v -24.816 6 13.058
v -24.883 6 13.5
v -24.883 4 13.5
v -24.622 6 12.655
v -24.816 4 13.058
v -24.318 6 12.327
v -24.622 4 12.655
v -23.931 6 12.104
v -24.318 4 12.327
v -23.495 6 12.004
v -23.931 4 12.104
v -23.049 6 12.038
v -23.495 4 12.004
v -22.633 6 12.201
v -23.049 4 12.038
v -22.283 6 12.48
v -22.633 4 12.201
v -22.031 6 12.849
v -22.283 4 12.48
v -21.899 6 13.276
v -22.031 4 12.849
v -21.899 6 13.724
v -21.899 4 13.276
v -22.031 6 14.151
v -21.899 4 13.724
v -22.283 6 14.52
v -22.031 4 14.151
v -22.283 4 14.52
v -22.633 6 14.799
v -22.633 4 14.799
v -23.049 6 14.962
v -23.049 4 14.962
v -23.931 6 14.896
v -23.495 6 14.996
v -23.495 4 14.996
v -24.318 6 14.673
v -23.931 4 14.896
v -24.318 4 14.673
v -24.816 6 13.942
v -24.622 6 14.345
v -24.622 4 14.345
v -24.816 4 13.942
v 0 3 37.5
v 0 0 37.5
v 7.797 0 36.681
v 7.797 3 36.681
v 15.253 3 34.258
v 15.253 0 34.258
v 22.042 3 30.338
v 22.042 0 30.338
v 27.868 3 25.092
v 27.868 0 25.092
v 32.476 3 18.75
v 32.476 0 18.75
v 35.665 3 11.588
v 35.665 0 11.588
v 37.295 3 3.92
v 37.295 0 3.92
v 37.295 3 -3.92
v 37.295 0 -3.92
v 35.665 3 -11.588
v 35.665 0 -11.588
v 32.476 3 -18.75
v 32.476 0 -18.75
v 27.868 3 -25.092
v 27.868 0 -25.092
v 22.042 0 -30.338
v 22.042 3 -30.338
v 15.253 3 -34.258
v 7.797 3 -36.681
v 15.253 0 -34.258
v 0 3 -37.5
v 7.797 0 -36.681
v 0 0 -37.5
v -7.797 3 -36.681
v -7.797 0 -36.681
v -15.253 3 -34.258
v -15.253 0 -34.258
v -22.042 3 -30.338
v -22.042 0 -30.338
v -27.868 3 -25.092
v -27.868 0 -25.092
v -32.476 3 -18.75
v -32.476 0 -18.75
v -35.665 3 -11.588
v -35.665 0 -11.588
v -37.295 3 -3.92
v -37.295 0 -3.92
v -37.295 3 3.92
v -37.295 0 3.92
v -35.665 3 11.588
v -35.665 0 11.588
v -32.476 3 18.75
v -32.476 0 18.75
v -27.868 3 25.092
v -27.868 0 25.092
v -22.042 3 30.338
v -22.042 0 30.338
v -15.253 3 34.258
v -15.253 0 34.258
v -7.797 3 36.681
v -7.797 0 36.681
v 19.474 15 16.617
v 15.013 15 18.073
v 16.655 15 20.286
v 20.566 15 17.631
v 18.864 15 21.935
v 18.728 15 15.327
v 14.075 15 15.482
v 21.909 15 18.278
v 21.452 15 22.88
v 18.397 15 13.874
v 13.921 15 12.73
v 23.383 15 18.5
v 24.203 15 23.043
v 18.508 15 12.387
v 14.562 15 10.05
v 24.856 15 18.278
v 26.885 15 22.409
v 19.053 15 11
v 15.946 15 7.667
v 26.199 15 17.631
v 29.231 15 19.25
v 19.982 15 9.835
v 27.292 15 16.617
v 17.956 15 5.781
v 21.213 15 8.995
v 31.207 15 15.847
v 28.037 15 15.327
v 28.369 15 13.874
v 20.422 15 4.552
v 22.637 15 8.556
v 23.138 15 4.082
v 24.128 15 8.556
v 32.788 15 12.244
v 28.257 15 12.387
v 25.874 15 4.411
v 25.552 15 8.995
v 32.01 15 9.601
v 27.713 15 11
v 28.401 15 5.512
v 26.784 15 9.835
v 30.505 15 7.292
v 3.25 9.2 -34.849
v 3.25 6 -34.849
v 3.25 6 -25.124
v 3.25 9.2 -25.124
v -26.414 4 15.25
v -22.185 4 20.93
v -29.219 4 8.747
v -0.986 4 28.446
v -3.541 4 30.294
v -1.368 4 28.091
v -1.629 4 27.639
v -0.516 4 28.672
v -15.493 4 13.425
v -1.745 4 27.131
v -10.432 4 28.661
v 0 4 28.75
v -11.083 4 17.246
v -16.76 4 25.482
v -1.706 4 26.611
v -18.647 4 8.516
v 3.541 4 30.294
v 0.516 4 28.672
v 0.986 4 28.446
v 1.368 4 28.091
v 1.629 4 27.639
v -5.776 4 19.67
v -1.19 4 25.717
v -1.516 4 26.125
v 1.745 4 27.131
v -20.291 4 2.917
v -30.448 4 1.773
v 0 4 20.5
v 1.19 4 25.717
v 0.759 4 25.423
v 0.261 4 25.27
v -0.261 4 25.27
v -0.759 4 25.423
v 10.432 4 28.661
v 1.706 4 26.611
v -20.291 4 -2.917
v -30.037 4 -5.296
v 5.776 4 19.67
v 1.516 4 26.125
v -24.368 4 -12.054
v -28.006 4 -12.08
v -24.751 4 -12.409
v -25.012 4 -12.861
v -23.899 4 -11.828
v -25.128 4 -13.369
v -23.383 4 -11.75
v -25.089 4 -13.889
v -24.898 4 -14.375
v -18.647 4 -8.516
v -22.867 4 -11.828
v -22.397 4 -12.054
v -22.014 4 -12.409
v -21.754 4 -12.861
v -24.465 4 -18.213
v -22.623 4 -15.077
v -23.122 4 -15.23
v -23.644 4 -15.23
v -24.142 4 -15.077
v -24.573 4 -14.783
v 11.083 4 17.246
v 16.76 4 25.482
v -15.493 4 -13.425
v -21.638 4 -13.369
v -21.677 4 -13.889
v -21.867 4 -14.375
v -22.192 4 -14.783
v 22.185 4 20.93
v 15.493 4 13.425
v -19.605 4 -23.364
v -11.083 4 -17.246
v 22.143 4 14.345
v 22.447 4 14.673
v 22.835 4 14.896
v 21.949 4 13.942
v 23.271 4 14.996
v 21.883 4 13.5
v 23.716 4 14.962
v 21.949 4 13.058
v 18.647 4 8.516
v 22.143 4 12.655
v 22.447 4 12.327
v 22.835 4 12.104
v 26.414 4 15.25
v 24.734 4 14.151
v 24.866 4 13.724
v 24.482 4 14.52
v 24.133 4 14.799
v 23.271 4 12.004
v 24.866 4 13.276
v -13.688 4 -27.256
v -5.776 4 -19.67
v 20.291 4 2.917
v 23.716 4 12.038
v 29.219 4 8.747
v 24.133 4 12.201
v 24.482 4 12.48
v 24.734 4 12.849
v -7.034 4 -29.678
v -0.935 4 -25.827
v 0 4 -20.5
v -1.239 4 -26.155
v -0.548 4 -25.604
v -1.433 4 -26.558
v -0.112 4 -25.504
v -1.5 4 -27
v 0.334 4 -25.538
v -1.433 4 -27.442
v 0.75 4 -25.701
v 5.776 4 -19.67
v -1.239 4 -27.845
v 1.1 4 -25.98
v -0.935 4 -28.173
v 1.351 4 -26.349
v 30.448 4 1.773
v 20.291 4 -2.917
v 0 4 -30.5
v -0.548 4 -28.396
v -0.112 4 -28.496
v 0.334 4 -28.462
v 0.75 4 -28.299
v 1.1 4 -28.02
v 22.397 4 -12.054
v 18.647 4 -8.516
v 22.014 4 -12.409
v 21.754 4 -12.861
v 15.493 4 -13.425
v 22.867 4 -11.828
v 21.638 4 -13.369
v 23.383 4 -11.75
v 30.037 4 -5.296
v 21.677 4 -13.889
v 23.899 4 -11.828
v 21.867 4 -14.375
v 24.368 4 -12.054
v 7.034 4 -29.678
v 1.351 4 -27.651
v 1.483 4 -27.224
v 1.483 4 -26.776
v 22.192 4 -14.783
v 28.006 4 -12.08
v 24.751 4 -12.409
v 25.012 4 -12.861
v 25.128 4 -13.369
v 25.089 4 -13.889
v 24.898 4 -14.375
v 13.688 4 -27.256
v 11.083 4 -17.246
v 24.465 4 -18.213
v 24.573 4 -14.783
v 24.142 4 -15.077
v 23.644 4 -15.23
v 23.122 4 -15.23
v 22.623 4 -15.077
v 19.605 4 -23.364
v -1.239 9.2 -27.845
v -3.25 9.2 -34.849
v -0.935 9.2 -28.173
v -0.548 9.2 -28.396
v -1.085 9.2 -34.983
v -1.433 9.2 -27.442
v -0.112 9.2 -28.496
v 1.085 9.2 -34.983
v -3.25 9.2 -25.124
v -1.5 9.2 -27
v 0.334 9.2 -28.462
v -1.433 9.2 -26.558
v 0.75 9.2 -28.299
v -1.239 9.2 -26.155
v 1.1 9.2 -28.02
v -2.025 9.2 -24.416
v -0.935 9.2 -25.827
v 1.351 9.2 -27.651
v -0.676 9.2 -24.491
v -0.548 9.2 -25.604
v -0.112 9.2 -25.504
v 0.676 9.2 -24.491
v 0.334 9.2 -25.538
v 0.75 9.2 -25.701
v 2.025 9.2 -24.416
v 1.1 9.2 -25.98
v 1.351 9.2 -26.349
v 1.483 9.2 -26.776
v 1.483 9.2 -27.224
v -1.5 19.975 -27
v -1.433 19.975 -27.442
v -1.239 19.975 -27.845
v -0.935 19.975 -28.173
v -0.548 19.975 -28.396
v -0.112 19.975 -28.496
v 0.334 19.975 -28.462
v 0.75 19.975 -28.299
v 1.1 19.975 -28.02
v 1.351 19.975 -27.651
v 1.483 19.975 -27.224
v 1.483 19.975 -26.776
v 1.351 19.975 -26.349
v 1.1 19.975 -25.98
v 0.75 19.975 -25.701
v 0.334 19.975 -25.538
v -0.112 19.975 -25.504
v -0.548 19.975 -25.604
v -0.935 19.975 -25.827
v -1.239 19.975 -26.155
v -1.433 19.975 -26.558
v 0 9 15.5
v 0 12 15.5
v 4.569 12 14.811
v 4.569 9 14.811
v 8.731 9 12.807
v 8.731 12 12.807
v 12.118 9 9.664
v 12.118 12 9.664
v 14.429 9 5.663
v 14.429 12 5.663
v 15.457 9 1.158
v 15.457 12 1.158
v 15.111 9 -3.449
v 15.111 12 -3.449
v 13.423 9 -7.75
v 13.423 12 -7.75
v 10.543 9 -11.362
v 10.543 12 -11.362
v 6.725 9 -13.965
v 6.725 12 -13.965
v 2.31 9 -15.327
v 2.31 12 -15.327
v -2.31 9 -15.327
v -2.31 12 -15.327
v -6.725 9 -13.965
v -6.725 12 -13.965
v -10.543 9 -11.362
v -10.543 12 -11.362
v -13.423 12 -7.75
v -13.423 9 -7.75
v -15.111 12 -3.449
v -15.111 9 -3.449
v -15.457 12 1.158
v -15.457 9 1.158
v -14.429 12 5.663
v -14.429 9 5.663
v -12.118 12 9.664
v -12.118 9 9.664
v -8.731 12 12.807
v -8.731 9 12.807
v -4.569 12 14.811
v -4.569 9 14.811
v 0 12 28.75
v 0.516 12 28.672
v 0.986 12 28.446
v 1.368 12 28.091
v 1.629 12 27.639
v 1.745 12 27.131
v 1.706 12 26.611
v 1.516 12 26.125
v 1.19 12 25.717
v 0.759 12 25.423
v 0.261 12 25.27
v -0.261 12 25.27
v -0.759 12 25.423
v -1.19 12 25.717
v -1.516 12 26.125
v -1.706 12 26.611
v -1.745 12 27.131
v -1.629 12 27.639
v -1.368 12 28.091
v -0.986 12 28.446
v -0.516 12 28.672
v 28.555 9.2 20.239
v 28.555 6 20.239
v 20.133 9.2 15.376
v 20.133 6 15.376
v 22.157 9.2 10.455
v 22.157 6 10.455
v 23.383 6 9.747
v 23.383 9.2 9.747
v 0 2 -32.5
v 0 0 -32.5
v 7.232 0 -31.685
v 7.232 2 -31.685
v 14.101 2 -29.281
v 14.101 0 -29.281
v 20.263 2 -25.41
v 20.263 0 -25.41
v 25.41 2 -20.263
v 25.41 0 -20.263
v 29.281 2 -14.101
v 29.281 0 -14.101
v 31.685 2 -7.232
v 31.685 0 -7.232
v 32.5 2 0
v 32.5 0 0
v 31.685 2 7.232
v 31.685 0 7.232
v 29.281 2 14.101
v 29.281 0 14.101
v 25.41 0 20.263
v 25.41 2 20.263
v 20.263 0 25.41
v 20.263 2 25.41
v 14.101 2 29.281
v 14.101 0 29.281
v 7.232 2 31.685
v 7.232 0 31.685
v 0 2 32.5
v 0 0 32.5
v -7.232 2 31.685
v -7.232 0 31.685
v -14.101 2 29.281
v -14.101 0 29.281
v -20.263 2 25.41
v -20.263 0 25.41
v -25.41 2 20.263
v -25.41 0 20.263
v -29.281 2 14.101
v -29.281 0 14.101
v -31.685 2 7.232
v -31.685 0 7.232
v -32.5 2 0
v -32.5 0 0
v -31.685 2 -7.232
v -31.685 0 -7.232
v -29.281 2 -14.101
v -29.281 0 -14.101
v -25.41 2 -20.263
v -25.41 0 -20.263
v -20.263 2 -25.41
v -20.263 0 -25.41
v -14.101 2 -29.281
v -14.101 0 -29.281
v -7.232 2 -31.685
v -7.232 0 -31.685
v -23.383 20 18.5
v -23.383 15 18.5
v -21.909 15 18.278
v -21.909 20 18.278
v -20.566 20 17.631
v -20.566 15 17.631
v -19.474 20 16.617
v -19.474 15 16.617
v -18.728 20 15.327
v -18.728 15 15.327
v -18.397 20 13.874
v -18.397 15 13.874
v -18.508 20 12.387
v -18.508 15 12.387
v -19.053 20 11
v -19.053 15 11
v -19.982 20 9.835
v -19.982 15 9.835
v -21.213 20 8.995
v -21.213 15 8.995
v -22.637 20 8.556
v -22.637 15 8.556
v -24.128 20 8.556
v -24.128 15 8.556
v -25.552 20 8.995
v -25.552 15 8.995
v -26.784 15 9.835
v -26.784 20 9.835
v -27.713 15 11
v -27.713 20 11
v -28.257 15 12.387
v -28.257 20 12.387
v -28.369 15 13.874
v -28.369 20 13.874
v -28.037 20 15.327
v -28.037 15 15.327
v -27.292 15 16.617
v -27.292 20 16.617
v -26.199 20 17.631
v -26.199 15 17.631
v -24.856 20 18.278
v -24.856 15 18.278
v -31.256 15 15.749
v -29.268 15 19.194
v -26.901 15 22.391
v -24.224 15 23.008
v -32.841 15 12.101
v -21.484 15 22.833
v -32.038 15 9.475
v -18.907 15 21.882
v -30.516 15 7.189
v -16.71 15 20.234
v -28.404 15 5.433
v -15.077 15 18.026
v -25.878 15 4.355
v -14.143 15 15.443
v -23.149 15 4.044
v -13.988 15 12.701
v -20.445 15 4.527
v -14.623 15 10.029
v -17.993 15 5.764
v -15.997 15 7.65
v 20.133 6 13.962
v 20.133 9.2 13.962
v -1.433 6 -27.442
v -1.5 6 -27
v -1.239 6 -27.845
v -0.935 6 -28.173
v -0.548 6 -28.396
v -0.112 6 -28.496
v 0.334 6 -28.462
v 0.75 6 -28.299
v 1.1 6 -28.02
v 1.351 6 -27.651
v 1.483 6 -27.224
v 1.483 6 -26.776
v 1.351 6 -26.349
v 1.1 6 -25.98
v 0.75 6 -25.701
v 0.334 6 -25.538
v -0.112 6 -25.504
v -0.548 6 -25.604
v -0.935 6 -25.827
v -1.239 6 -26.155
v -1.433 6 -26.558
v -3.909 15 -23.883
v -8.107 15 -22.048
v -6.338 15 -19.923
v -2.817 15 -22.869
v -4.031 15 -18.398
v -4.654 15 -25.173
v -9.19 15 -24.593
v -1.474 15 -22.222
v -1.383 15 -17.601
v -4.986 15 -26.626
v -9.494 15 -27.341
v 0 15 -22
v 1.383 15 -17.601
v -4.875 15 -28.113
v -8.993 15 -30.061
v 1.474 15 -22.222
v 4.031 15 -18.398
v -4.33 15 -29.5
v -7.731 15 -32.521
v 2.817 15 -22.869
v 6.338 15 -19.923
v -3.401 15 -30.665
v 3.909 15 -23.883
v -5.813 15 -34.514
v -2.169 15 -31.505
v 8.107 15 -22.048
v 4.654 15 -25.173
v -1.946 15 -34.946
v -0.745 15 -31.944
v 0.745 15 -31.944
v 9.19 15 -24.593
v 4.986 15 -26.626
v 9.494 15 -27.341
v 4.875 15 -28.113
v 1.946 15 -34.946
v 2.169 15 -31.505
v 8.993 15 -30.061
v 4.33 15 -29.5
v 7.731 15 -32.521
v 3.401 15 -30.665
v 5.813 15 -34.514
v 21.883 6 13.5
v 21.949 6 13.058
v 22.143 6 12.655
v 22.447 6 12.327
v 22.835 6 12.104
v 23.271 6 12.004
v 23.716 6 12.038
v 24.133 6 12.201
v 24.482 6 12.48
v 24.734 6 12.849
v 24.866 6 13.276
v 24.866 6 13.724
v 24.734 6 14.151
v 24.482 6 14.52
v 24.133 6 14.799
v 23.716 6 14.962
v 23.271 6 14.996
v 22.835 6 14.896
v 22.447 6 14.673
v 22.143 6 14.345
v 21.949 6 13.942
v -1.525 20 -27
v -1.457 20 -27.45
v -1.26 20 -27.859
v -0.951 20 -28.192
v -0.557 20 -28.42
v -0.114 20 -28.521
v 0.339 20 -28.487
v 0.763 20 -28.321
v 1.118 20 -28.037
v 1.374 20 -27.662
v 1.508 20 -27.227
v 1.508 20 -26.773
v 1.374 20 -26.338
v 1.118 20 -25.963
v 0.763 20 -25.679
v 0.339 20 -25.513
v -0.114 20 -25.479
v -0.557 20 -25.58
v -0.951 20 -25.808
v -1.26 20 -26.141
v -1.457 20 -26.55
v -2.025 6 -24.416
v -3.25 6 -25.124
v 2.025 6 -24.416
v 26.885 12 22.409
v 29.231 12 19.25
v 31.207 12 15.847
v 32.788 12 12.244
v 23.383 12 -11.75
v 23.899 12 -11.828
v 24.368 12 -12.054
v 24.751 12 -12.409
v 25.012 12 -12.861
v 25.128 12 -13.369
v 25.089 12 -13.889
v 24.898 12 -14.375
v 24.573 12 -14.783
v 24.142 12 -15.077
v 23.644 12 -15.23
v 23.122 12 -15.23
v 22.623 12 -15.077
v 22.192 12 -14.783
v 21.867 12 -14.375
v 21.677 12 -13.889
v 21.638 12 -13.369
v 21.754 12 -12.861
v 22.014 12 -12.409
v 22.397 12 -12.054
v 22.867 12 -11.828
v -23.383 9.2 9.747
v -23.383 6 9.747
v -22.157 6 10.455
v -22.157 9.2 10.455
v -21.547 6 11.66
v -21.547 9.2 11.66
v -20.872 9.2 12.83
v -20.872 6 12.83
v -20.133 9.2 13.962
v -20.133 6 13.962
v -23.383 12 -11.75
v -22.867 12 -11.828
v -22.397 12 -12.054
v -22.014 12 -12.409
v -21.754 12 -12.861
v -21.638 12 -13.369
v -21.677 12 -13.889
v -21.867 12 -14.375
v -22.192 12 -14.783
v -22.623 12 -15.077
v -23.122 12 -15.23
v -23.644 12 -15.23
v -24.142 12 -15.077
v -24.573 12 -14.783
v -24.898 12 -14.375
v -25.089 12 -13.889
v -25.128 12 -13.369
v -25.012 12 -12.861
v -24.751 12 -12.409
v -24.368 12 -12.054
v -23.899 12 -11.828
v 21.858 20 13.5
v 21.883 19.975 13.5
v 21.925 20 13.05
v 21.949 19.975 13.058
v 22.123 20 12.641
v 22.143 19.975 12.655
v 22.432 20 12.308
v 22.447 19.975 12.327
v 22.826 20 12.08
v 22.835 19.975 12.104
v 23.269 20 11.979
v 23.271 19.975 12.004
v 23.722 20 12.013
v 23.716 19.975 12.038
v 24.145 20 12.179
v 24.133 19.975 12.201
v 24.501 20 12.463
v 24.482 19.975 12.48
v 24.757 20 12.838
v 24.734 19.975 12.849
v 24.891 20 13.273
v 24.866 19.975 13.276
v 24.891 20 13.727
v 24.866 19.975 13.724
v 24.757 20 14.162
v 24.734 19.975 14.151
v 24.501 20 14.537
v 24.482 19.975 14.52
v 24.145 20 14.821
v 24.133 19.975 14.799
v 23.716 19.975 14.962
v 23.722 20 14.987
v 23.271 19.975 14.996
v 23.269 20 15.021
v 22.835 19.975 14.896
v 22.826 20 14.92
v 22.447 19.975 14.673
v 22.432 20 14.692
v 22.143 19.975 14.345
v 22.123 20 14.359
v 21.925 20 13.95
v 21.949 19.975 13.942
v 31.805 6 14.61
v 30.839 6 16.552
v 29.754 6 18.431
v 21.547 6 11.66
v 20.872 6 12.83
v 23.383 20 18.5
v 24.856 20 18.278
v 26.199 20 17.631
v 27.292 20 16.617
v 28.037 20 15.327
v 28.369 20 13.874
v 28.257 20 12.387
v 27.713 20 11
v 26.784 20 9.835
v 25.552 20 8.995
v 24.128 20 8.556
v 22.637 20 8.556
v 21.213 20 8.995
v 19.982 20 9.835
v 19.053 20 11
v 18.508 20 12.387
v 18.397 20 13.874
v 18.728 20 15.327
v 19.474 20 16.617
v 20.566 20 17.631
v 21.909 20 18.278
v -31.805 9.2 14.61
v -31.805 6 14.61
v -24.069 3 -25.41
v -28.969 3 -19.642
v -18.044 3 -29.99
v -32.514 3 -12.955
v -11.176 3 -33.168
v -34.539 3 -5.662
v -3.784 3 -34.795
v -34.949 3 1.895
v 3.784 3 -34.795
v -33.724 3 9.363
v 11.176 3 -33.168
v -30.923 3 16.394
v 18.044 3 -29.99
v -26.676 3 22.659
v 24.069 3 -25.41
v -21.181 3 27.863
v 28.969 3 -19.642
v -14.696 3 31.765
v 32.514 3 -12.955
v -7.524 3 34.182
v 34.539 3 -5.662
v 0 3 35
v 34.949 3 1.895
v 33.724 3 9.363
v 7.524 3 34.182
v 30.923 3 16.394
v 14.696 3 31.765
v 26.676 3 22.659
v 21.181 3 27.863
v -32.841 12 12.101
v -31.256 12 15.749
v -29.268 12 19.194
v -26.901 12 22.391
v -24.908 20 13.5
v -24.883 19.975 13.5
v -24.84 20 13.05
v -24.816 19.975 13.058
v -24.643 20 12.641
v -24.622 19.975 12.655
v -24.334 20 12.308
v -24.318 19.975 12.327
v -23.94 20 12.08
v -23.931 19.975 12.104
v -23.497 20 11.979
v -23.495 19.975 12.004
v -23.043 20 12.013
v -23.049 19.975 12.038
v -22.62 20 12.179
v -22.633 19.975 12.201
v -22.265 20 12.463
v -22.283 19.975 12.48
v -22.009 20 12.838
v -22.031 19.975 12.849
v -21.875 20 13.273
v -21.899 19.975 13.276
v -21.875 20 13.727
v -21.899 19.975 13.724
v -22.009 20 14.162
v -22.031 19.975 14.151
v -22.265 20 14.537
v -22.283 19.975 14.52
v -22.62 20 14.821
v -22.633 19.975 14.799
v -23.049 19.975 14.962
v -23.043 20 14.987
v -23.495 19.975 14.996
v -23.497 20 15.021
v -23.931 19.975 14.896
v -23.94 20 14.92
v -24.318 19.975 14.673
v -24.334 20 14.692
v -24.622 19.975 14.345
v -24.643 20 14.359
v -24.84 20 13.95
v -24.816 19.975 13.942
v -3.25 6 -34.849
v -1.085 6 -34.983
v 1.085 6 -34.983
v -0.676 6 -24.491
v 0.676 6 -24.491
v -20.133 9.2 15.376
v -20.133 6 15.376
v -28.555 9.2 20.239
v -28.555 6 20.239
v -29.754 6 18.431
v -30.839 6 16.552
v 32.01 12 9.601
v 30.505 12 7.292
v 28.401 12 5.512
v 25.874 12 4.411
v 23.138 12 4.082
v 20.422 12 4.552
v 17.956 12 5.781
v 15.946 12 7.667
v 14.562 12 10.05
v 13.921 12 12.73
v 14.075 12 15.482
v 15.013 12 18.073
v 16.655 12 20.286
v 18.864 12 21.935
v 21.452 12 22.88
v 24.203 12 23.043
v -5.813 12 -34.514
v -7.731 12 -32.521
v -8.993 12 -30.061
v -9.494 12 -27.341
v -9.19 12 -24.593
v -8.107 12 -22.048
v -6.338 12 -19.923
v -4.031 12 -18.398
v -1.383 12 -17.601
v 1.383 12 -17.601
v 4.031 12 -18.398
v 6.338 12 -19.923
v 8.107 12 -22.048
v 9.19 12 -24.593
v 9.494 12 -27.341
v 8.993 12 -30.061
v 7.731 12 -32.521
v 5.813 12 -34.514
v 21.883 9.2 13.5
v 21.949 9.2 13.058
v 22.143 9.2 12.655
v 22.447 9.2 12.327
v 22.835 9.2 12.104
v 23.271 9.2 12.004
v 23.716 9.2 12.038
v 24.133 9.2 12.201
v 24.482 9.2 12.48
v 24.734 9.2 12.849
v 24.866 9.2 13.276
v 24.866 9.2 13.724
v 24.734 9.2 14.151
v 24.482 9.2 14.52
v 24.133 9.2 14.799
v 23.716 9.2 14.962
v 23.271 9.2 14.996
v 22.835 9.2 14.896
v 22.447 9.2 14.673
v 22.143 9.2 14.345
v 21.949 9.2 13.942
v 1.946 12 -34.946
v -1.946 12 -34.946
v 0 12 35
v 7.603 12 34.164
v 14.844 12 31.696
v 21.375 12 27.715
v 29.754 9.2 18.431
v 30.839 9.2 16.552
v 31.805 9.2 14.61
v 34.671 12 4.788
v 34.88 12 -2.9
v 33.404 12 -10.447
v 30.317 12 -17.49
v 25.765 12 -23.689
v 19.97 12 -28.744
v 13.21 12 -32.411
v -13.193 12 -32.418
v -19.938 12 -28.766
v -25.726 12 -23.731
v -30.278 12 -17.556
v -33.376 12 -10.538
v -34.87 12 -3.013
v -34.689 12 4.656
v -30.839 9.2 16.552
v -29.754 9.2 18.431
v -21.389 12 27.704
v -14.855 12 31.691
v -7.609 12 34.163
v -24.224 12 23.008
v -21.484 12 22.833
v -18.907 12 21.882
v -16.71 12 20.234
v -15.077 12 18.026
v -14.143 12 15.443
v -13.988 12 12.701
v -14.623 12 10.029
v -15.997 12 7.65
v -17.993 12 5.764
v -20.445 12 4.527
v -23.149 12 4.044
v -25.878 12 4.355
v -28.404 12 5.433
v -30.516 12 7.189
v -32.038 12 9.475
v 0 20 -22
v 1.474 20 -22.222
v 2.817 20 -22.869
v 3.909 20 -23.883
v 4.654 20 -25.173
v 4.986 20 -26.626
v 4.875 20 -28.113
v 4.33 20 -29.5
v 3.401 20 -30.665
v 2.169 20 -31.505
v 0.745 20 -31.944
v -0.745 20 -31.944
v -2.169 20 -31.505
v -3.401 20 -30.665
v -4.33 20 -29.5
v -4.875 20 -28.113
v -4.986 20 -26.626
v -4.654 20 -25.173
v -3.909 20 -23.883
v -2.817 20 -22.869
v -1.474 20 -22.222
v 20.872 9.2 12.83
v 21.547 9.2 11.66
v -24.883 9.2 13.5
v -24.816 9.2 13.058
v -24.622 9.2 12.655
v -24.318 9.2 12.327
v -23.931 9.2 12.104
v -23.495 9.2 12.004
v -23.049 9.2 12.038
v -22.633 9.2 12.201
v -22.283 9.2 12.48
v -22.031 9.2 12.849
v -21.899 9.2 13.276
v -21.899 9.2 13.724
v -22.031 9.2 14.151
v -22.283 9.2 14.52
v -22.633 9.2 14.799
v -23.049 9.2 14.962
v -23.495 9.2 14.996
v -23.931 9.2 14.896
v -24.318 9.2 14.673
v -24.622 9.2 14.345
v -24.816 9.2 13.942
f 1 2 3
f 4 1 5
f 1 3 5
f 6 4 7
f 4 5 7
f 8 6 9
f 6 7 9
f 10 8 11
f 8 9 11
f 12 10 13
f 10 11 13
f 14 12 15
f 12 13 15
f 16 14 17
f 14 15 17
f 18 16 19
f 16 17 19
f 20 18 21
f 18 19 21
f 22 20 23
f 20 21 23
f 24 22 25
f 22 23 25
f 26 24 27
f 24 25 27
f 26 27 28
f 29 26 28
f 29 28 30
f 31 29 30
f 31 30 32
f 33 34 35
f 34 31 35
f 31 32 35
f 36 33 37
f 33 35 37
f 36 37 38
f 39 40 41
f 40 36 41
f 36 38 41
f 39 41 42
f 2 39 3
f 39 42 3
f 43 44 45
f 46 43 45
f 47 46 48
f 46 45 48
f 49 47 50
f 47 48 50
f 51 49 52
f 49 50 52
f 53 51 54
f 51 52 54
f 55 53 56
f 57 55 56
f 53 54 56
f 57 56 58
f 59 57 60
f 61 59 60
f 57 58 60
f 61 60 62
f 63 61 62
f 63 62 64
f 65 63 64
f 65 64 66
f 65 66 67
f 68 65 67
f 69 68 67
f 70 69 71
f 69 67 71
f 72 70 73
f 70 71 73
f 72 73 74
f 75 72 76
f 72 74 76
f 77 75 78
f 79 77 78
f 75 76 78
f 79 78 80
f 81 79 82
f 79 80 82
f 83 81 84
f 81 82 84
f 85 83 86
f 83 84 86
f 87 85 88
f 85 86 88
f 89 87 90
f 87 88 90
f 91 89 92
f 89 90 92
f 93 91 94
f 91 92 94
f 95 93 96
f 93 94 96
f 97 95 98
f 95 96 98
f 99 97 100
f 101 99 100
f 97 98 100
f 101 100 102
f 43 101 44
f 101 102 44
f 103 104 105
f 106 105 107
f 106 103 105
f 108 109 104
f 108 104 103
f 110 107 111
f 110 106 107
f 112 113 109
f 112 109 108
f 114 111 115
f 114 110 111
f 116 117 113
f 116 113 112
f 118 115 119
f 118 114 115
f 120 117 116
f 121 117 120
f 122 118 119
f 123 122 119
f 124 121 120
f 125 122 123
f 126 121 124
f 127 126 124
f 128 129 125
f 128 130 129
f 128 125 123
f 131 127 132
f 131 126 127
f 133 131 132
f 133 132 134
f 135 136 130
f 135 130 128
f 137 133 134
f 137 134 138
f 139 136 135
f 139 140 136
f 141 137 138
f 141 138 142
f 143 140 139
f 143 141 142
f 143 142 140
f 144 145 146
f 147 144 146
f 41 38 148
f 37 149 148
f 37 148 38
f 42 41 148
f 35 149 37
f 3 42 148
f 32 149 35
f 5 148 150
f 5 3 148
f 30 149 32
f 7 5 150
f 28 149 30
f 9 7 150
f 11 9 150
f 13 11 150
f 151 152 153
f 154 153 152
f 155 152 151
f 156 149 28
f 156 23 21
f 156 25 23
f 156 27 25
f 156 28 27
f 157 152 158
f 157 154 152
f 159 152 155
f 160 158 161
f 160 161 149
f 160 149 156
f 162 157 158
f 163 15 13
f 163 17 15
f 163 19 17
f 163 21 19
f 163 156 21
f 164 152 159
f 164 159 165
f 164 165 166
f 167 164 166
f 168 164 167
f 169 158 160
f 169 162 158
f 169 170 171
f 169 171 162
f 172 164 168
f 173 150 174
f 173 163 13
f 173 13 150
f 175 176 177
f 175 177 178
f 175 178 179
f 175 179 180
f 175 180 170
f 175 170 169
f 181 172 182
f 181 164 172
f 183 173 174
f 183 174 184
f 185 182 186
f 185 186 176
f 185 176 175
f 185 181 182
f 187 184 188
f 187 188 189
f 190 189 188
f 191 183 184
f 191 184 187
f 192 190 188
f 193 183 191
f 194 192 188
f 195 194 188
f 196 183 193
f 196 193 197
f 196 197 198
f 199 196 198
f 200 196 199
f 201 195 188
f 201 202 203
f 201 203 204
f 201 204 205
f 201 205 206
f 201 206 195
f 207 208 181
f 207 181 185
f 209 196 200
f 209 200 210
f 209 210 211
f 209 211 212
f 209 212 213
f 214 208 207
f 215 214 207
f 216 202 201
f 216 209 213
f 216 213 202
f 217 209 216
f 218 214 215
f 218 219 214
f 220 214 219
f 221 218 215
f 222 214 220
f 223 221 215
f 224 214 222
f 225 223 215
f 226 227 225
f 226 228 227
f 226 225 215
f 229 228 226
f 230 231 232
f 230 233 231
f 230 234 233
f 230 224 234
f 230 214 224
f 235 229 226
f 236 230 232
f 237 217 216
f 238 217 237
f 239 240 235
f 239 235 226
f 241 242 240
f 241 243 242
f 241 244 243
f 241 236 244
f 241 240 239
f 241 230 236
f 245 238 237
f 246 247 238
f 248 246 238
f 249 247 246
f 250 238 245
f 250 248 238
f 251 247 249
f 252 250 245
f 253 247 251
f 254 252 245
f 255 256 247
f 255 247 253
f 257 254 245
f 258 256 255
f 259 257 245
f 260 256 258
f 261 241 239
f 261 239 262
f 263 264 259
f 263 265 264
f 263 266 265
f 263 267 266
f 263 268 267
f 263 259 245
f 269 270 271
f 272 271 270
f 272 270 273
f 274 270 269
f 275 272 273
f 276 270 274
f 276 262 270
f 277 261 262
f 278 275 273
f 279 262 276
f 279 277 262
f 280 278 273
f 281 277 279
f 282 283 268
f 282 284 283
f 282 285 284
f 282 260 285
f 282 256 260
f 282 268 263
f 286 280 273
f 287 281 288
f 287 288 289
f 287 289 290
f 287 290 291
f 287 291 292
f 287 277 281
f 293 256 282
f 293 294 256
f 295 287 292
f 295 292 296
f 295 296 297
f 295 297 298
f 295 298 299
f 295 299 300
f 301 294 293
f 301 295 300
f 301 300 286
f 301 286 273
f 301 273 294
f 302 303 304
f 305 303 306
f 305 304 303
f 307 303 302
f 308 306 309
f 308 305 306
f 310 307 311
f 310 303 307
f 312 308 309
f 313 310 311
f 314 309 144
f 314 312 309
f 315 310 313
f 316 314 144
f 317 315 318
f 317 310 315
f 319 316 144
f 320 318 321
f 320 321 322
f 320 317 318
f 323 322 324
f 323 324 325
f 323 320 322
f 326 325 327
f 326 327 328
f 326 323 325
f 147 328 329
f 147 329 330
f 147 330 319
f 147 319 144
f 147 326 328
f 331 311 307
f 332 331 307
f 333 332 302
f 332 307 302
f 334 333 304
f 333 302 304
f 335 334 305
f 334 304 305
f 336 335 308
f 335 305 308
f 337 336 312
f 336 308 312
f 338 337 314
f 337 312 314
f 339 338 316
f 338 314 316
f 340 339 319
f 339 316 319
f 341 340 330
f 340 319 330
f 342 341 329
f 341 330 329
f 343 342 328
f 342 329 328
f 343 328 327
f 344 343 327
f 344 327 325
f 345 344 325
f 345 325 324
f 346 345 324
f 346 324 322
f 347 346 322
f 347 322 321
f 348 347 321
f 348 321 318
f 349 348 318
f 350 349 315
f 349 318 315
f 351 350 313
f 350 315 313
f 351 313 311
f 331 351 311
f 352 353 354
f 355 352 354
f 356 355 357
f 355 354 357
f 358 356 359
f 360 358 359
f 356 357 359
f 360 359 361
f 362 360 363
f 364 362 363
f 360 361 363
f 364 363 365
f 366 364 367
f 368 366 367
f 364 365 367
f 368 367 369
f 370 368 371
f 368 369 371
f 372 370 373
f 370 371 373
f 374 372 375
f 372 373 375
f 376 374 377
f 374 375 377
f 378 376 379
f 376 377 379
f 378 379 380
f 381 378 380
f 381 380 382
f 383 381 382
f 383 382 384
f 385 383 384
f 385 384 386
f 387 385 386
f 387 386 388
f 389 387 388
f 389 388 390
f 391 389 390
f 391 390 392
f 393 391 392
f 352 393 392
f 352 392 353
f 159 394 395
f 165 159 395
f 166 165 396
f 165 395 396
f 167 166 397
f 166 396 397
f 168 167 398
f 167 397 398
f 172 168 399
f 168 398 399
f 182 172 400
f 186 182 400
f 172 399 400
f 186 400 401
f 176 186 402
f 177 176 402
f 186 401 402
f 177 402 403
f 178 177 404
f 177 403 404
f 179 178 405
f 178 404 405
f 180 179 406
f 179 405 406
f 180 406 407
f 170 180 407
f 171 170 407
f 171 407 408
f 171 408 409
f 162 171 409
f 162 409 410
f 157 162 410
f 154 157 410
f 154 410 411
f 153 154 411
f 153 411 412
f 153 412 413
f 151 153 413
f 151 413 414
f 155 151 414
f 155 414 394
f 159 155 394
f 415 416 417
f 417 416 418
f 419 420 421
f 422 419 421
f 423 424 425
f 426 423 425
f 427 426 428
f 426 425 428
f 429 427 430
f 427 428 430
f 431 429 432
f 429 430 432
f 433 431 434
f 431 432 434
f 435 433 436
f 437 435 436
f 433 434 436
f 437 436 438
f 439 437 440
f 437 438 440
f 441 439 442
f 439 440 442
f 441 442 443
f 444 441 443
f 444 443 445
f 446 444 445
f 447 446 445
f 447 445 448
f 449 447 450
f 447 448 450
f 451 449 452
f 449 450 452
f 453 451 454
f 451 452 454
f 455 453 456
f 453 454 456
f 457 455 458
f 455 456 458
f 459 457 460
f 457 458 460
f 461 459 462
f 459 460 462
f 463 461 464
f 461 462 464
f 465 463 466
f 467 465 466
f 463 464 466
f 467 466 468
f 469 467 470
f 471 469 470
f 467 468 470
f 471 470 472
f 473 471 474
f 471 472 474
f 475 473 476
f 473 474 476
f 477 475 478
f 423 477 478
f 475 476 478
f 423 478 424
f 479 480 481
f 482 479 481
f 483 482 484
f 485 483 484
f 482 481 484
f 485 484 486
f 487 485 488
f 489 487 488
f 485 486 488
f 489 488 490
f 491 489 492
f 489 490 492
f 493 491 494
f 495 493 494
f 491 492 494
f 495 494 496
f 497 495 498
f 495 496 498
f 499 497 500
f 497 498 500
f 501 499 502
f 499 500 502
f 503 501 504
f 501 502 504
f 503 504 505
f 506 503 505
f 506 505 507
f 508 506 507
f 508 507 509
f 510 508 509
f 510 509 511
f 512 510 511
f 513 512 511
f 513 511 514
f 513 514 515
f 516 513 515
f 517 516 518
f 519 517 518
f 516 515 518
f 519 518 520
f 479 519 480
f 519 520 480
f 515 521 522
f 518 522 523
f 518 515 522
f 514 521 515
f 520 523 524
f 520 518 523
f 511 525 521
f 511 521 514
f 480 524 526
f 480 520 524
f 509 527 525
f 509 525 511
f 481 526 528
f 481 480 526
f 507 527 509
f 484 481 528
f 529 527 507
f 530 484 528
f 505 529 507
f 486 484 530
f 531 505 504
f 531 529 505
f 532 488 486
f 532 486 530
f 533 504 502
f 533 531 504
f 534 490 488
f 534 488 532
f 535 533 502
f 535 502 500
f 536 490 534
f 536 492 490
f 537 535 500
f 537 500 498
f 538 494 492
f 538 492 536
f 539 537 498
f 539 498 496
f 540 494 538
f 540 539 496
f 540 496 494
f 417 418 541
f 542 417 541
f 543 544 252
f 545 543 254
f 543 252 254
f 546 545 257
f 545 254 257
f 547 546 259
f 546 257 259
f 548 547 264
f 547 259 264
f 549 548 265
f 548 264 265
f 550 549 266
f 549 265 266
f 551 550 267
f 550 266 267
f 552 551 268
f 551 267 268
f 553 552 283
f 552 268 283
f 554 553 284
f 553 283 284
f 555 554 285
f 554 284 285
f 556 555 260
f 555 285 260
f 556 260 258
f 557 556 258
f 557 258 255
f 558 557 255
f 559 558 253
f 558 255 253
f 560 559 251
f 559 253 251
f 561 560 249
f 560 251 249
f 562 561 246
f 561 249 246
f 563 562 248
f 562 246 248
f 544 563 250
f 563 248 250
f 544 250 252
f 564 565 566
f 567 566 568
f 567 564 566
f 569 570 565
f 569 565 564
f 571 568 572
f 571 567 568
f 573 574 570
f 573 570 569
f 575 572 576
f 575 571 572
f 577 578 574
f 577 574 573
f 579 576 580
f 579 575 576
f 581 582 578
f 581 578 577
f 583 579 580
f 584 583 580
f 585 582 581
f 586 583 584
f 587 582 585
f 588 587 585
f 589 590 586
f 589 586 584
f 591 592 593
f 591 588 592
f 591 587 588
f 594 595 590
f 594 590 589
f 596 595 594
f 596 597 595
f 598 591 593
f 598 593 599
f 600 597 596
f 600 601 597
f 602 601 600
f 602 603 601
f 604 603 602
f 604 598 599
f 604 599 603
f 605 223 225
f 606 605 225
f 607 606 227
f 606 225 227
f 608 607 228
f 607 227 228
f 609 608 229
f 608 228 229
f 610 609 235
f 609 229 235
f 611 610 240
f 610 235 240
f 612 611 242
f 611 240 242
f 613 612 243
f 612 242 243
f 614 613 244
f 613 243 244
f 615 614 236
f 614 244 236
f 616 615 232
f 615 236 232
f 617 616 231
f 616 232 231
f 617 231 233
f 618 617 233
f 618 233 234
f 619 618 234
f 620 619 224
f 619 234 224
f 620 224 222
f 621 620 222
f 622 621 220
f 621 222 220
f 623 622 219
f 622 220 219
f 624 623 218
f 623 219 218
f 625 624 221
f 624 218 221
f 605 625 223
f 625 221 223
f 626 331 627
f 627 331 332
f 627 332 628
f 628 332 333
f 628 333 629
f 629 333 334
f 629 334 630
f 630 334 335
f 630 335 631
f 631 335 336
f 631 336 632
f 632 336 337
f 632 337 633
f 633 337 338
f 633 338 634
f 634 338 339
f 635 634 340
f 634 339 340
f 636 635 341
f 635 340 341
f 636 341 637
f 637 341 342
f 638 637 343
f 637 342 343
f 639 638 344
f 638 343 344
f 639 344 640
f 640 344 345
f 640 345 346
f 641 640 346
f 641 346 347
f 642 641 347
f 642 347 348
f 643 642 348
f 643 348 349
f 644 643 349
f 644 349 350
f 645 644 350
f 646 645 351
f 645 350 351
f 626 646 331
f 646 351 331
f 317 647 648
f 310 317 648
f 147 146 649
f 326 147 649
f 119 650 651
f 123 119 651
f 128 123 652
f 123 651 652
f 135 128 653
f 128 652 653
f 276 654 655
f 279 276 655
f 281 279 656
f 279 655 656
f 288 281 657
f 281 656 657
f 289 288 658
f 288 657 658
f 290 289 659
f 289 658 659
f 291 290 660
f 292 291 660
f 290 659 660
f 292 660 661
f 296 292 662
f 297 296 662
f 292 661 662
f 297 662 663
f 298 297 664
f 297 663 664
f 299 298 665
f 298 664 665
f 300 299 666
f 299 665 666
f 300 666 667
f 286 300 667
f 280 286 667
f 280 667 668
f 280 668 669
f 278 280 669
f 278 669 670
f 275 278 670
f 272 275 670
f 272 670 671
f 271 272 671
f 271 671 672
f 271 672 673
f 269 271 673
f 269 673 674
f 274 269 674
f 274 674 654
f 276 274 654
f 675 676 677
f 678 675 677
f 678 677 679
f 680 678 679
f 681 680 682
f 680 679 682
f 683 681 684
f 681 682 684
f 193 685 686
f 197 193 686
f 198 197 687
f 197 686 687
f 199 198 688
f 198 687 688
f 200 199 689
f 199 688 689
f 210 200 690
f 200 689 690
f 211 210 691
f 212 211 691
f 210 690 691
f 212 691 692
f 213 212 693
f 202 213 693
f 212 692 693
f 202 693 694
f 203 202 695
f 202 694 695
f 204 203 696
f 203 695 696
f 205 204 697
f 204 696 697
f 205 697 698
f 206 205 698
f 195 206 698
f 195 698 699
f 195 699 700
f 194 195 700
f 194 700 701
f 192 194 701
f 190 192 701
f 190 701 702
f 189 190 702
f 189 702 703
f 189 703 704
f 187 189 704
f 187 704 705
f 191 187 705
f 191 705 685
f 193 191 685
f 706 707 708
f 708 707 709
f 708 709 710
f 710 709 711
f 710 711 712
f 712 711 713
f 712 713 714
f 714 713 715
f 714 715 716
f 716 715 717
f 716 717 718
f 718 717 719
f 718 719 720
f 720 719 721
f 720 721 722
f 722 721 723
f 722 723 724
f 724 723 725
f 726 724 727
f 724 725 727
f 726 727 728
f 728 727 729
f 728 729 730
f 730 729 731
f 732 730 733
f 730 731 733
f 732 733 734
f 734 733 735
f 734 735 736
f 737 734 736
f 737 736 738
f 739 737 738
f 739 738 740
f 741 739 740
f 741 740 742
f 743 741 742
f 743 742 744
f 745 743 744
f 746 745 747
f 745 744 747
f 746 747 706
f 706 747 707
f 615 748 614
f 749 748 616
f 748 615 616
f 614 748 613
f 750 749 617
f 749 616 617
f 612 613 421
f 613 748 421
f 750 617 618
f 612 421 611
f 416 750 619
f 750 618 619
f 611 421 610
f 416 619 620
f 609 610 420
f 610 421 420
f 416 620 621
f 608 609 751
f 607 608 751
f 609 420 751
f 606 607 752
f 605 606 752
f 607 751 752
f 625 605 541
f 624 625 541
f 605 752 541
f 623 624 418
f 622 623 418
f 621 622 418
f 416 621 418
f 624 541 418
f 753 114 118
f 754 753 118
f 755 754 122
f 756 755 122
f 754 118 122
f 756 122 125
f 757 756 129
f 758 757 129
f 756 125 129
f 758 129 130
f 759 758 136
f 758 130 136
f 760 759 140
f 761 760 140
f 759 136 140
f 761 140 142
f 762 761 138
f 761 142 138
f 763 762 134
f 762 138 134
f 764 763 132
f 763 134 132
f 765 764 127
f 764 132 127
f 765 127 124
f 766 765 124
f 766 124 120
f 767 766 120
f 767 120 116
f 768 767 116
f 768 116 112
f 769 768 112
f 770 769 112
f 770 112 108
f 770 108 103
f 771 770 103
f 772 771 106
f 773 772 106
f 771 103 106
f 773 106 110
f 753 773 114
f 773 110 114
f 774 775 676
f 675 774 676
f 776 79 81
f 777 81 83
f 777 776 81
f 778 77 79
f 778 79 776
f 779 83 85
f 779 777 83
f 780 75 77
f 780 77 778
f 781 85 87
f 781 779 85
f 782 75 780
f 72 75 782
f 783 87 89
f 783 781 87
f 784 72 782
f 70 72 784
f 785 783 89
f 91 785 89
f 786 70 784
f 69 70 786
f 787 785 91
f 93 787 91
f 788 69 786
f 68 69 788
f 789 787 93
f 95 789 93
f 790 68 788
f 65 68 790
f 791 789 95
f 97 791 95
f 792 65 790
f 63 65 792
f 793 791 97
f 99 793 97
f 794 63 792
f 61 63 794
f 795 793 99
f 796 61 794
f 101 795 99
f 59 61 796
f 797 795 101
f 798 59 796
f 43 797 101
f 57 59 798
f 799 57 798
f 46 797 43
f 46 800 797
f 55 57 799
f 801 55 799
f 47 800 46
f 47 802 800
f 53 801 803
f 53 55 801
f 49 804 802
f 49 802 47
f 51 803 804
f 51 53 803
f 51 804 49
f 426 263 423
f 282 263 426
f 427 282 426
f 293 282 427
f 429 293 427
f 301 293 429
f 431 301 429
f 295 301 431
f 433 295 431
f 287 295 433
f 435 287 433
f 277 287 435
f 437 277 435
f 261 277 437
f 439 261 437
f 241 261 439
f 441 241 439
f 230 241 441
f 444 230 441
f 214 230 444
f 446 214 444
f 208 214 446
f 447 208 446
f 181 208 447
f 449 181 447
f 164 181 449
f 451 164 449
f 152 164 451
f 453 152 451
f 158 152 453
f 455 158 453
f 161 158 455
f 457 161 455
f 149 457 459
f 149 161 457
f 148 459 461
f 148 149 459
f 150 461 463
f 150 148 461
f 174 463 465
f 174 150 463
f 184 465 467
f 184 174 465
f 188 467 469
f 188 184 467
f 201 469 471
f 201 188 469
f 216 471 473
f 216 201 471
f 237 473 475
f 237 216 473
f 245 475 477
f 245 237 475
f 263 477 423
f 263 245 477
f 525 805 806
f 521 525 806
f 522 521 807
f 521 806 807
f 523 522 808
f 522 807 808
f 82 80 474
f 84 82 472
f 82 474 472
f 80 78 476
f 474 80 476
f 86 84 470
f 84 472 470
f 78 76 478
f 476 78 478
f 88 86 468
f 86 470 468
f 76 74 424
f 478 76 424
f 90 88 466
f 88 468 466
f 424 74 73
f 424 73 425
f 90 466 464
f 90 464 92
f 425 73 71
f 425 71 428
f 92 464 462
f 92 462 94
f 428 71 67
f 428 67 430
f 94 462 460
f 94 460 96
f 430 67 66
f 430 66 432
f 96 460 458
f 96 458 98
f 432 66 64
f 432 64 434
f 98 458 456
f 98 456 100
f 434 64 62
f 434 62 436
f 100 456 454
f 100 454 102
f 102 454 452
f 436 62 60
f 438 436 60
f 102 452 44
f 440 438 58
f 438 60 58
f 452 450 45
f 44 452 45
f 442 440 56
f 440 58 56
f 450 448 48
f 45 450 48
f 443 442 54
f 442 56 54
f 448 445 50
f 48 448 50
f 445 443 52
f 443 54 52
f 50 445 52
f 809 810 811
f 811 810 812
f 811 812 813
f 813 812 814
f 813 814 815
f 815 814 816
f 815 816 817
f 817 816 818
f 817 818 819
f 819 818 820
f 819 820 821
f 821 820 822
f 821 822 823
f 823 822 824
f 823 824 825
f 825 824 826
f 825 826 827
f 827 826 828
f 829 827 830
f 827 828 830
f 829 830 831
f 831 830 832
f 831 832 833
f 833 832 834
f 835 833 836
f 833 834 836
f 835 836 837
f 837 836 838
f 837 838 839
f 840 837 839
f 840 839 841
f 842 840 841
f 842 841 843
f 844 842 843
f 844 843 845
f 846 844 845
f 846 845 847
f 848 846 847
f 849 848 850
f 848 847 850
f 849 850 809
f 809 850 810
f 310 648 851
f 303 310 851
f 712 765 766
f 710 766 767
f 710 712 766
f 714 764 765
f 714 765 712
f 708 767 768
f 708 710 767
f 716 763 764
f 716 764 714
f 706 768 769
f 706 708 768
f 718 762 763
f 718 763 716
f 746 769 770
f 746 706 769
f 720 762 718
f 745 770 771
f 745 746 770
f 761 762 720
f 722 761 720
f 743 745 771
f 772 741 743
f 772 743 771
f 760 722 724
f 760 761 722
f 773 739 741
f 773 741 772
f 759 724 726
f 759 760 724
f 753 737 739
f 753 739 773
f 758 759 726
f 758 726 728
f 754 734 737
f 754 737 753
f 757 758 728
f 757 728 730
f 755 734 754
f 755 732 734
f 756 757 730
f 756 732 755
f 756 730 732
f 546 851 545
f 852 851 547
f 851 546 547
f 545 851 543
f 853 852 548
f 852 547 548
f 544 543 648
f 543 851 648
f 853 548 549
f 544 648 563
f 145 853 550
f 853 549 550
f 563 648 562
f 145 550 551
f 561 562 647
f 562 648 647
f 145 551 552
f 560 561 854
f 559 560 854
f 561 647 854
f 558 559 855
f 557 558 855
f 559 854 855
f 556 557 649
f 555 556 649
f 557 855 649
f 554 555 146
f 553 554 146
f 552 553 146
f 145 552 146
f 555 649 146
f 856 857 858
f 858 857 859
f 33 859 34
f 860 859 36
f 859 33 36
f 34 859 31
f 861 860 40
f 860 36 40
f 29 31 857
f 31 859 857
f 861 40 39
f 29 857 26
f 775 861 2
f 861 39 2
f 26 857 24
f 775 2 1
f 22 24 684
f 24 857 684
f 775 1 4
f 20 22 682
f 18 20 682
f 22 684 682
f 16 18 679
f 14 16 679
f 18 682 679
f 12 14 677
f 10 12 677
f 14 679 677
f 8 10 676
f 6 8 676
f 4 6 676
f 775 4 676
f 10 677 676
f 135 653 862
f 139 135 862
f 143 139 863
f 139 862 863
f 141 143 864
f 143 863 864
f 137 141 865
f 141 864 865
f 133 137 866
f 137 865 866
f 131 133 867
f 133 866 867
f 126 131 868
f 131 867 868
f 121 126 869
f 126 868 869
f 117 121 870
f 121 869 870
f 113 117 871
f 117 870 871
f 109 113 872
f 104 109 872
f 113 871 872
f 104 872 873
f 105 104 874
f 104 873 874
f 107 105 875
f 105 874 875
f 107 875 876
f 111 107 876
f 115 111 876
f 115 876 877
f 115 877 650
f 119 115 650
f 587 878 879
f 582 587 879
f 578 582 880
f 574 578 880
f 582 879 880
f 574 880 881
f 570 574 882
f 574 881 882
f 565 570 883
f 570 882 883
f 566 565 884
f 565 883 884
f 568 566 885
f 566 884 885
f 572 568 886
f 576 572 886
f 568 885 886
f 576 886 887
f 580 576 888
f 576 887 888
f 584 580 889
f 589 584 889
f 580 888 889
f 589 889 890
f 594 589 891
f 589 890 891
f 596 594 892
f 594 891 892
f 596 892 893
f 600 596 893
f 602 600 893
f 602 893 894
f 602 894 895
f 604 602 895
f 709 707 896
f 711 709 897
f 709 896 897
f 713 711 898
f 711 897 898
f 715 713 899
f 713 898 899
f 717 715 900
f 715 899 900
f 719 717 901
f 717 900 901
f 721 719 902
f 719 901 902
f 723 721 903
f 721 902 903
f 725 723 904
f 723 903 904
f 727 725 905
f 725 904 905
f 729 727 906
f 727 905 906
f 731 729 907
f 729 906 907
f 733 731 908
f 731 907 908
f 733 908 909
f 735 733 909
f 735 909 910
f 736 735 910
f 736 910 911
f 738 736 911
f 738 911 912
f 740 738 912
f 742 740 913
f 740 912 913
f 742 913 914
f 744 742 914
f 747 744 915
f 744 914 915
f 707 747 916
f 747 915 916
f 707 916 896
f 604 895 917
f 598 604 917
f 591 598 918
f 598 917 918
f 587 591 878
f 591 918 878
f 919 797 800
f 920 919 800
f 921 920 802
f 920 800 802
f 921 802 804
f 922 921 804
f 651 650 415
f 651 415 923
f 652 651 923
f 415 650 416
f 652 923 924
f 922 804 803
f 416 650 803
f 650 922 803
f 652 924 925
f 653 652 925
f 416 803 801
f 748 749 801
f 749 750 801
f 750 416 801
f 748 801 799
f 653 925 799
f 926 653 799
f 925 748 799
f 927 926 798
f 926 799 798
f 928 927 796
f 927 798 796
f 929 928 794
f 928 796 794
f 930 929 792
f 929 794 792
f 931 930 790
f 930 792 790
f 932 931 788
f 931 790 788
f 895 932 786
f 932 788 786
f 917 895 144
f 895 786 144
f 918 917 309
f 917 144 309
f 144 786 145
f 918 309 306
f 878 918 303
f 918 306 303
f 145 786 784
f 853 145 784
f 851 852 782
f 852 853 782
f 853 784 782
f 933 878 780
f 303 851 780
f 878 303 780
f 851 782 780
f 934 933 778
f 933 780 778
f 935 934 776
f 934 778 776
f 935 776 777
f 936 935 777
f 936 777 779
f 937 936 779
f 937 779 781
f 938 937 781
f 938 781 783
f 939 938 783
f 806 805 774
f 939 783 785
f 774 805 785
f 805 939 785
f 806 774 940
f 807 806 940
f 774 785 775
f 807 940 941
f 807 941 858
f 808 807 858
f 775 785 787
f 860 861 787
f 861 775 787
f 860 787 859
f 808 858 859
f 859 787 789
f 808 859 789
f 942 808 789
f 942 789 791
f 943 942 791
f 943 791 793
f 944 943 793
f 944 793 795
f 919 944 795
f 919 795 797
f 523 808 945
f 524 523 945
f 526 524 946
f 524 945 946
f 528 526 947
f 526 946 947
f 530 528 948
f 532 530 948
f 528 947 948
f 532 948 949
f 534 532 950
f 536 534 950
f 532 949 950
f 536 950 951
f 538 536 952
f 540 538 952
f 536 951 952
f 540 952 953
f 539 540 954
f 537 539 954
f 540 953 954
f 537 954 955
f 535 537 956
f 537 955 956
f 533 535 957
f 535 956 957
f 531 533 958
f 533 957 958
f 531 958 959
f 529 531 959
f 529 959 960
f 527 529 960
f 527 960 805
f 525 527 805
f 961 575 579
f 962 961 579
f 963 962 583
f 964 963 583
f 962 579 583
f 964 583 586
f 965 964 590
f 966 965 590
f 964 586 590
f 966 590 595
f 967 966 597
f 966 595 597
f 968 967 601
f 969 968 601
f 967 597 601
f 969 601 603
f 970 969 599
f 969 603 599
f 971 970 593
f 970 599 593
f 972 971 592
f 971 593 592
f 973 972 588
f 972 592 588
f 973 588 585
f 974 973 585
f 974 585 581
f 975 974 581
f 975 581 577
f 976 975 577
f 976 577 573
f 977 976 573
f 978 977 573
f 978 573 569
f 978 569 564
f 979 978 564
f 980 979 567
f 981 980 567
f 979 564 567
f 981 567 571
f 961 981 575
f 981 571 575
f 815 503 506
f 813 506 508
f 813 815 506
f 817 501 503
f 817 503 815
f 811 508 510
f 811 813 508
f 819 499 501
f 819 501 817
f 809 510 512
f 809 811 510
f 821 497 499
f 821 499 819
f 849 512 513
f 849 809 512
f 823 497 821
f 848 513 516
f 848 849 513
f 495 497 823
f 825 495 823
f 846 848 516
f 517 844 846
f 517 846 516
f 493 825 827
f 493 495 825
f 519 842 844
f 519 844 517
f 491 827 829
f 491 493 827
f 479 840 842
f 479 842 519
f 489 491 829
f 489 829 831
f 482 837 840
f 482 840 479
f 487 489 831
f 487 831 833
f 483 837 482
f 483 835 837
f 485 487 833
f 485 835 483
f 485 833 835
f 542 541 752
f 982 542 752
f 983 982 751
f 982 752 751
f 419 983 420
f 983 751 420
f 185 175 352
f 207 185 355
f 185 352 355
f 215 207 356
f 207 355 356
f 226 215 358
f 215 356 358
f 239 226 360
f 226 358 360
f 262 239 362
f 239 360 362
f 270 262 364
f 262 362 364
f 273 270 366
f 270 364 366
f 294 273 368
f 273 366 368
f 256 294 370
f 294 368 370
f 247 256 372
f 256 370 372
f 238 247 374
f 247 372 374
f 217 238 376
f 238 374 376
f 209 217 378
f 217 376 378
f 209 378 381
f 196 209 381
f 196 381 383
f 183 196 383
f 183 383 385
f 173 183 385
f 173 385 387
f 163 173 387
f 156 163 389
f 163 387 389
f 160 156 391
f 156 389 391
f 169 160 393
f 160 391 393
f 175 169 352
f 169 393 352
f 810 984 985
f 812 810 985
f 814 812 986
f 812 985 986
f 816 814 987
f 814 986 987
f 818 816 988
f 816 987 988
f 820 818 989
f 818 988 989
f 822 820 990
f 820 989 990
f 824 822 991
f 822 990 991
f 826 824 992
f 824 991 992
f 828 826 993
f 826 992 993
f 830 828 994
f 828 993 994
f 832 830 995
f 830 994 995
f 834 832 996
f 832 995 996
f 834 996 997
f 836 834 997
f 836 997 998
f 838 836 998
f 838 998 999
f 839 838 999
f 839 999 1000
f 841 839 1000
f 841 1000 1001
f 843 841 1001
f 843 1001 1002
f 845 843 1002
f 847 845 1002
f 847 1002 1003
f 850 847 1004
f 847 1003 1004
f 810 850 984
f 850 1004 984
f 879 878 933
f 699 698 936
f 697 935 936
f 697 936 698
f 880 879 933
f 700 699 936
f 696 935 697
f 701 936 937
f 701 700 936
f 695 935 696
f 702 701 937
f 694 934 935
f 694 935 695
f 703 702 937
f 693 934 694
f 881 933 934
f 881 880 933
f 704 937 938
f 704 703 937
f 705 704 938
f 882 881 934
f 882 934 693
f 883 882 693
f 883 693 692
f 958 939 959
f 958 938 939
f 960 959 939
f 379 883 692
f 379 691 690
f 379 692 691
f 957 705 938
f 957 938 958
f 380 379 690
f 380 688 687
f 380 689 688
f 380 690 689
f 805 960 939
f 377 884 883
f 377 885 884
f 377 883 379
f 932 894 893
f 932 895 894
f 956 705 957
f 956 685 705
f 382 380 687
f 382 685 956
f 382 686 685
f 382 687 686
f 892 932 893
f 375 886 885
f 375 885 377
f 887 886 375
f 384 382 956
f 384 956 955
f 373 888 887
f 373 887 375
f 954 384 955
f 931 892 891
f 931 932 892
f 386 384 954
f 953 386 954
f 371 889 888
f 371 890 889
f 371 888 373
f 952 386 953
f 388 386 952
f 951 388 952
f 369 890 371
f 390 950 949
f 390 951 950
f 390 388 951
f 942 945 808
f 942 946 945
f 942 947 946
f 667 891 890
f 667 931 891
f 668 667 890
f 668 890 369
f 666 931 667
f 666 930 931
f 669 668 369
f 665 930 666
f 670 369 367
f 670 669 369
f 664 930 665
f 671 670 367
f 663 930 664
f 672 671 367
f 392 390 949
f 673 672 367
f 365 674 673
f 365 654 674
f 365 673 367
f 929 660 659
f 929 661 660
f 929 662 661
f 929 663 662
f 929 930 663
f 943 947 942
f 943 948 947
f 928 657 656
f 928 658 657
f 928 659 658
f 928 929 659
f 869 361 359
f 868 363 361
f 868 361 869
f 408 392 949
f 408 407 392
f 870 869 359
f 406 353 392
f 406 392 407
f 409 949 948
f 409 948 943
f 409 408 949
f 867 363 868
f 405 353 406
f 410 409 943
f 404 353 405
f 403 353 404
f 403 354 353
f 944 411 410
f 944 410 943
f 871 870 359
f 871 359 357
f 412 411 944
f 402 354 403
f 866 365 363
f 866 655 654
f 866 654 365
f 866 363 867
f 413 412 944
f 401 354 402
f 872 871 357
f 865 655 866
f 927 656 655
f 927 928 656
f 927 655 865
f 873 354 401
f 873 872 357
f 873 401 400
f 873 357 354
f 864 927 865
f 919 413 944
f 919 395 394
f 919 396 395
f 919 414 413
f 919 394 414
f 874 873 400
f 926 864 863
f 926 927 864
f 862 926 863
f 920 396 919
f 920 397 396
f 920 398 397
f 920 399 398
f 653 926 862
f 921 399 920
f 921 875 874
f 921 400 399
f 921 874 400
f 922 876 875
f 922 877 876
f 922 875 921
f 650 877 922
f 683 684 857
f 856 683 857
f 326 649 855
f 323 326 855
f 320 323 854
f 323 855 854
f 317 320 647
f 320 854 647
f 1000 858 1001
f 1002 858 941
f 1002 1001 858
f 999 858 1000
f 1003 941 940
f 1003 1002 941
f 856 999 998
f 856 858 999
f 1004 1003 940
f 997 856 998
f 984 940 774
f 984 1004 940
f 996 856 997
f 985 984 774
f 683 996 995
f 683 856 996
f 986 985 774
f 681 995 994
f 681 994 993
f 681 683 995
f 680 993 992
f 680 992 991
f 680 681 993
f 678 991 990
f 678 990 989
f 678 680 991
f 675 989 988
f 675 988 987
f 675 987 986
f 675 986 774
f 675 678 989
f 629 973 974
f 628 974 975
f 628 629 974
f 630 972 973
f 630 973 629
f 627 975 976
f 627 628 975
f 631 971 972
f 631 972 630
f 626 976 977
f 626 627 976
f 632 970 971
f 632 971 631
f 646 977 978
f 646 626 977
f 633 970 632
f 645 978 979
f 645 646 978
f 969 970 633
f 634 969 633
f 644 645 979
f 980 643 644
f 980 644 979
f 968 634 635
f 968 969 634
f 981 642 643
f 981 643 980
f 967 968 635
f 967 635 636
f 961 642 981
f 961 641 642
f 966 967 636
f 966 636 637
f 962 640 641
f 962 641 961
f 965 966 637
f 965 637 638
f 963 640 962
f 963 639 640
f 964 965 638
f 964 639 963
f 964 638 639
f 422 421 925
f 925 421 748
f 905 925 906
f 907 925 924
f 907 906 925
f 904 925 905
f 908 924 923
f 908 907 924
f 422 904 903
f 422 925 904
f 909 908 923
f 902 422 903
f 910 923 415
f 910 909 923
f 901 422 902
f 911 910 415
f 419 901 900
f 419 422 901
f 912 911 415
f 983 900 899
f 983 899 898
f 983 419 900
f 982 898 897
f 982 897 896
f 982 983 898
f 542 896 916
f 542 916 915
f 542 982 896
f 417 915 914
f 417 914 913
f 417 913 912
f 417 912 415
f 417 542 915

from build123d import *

# Parameters (mm, degrees)
SKETCH1_R                       = 37.5
BOSS_EXTRUDE1_DEPTH             = 3
SKETCH1_3_R                     = 35
BOSS_EXTRUDE2_DEPTH             = 12
SKETCH4_R                       = 15.5
CUT_EXTRUDE1_DEPTH              = 15
BOSS_EXTRUDE3_DEPTH             = 3
SKETCH18_R                      = 5
BOSS_EXTRUDE4_DEPTH             = 5
CHAMFER1_SIZE                   = 9
F_3_0MM_DOWEL_HOLE1_D           = 3
F_3_0MM_DOWEL_HOLE1_CSINK_D     = 3.05
F_3_0MM_DOWEL_HOLE1_CSINK_ANGLE = 90
SKETCH27_R                      = 1.75
CUT_EXTRUDE2_DEPTH              = 55.373706881
CUT_EXTRUDE3_START              = -6
SKETCH28_R                      = 1.5
CUT_EXTRUDE3_DEPTH              = 3.2
CIRPATTERN1_COUNT               = 3
SKETCH29_R                      = 32.5
CUT_EXTRUDE4_DEPTH              = 4
CHAMFER2_SIZE                   = 2


with BuildPart() as part:
    # Sketch1 → Boss-Extrude1 (new body)
    with BuildSketch(Plane(origin=(0, 0, 0), x_dir=(1, 0, 0), z_dir=(0, 1, 0))):
        with Locations(Location((0, 0, 0), (0, 0, 270))):
            Circle(SKETCH1_R)
    extrude(amount=BOSS_EXTRUDE1_DEPTH)

    # Sketch1<3> → Boss-Extrude2 (add)
    with BuildSketch(Plane(origin=(0, 0, 0), x_dir=(1, 0, 0), z_dir=(0, 1, 0))):
        with Locations(Location((0, 0, 0), (0, 0, 270))):
            Circle(SKETCH1_3_R)
    extrude(amount=BOSS_EXTRUDE2_DEPTH)

    # Sketch4 → Cut-Extrude1 (cut)
    with BuildSketch(Plane(origin=(0, 12, 0), x_dir=(1, 0, 0), z_dir=(0, 1, 0))):
        with Locations(Location((0, 0, 0), (0, 0, 270))):
            Circle(SKETCH4_R)
    extrude(amount=-CUT_EXTRUDE1_DEPTH, mode=Mode.SUBTRACT)

    # Sketch5 → Boss-Extrude3 (add)
    with BuildSketch(Plane(origin=(0, 12, 0), x_dir=(1, 0, 0), z_dir=(0, 1, 0))):
        with BuildLine():
            ThreePointArc((5.813043417, 34.513888889), (0, 35), (-5.813043417, 34.513888889))
            ThreePointArc((-5.813043417, 34.513888889), (0, 17.5), (5.813043417, 34.513888889))
        make_face()
        with BuildLine():
            ThreePointArc((-26.900782734, -22.390799188), (-15.223614965, -8.789358198), (-32.841392275, -12.101361636))
            ThreePointArc((-32.841392275, -12.101361636), (-30.310889132, -17.5), (-26.900782734, -22.390799188))
        make_face()
        with BuildLine():
            ThreePointArc((26.885233446, -22.409467253), (30.266672739, -17.576362574), (32.7884636, -12.244045686))
            ThreePointArc((32.7884636, -12.244045686), (15.167446159, -8.807989412), (26.885233446, -22.409467253))
        make_face()
    extrude(amount=BOSS_EXTRUDE3_DEPTH)

    # Sketch18 → Boss-Extrude4 (add)
    with BuildSketch(Plane(origin=(0, 15, 0), x_dir=(1, 0, 0), z_dir=(0, 1, 0))):
        with Locations(Location((0, 27, 0), (0, 0, 270))):
            Circle(SKETCH18_R)
        with Locations(Location((23.382685902, -13.5, 0), (0, 0, 270))):
            Circle(SKETCH18_R)
        with Locations(Location((-23.382685902, -13.5, 0), (0, 0, 270))):
            Circle(SKETCH18_R)
    extrude(amount=BOSS_EXTRUDE4_DEPTH)

    # Chamfer1
    chamfer1_edges = [part.edges().sort_by_distance(p)[0] for p in [
        (0, 0, -15.5),
    ]]
    chamfer(chamfer1_edges, length=CHAMFER1_SIZE)

    # Ø3.0mm Dowel Hole1 (through all)
    with Locations(Plane(origin=(0, 20, 0), x_dir=(1, 0, 0), z_dir=(0, 1, 0))):
        with Locations((0, 27), (-23.382685902, -13.5), (23.382685902, -13.5)):
            CounterSinkHole(F_3_0MM_DOWEL_HOLE1_D / 2, F_3_0MM_DOWEL_HOLE1_CSINK_D / 2, counter_sink_angle=F_3_0MM_DOWEL_HOLE1_CSINK_ANGLE)

    # Sketch27 → Cut-Extrude2 (cut, through all)
    with BuildSketch(Plane(origin=(0, 12, 0), x_dir=(1, 0, 0), z_dir=(0, 1, 0))):
        with Locations(Location((23.382685902, 13.5, 0), (0, 0, 270))):
            Circle(SKETCH27_R)
        with Locations(Location((0, -27, 0), (0, 0, 270))):
            Circle(SKETCH27_R)
        with Locations(Location((-23.382685902, 13.5, 0), (0, 0, 270))):
            Circle(SKETCH27_R)
    extrude(amount=-CUT_EXTRUDE2_DEPTH, mode=Mode.SUBTRACT)

    # Sketch28 → Cut-Extrude3 (cut)
    # profile 1 of 2: a face of its own
    with BuildSketch(Plane.XZ.offset(CUT_EXTRUDE3_START)):
        with BuildLine():
            Line((3.25, -37.358901215), (3.25, -28.876388375))
            Line((3.25, -28.876388375), (0, -30.75277675))
            Line((0, -30.75277675), (-3.25, -28.876388375))
            Line((-3.25, -28.876388375), (-3.25, -37.358901215))
            ThreePointArc((-3.25, -37.358901215), (0, -37.5), (3.25, -37.358901215))
        make_face()
    # profile 2 of 2: a face of its own
    with BuildSketch(Plane.XZ.offset(CUT_EXTRUDE3_START)):
        with BuildLine():
            Line((3.25, -28.876388375), (3.25, -25.123611625))
            Line((3.25, -25.123611625), (2.024716505, -24.41619387))
            ThreePointArc((2.024716505, -24.41619387), (0, -24.5), (-2.024716505, -24.41619387))
            Line((-2.024716505, -24.41619387), (-3.25, -25.123611625))
            Line((-3.25, -25.123611625), (-3.25, -28.876388375))
            Line((-3.25, -28.876388375), (0, -30.75277675))
            Line((0, -30.75277675), (3.25, -28.876388375))
        make_face()
        with Locations(Location((0, -27, 0), (0, 0, 90))):
            Circle(SKETCH28_R, mode=Mode.SUBTRACT)
    cut_extrude3 = extrude(amount=-CUT_EXTRUDE3_DEPTH, mode=Mode.SUBTRACT)

    # CirPattern1: Cut-Extrude3 ×3 about axis
    cirpattern1_axis = Axis((0, 0, 0), (0, 1, 0))
    for i in range(1, CIRPATTERN1_COUNT):
        add(cut_extrude3.rotate(cirpattern1_axis, i * 360 / CIRPATTERN1_COUNT), mode=Mode.SUBTRACT)

    # Sketch29 → Cut-Extrude4 (cut)
    with BuildSketch(Plane.XZ):
        with Locations(Location((0, 0, 0), (0, 0, 270))):
            Circle(SKETCH29_R)
    extrude(amount=-CUT_EXTRUDE4_DEPTH, mode=Mode.SUBTRACT)

    # Chamfer2
    chamfer2_edges = [part.edges().sort_by_distance(p)[0] for p in [
        (0, 4, 32.5),
    ]]
    chamfer(chamfer2_edges, length=CHAMFER2_SIZE)


solid = part.part
